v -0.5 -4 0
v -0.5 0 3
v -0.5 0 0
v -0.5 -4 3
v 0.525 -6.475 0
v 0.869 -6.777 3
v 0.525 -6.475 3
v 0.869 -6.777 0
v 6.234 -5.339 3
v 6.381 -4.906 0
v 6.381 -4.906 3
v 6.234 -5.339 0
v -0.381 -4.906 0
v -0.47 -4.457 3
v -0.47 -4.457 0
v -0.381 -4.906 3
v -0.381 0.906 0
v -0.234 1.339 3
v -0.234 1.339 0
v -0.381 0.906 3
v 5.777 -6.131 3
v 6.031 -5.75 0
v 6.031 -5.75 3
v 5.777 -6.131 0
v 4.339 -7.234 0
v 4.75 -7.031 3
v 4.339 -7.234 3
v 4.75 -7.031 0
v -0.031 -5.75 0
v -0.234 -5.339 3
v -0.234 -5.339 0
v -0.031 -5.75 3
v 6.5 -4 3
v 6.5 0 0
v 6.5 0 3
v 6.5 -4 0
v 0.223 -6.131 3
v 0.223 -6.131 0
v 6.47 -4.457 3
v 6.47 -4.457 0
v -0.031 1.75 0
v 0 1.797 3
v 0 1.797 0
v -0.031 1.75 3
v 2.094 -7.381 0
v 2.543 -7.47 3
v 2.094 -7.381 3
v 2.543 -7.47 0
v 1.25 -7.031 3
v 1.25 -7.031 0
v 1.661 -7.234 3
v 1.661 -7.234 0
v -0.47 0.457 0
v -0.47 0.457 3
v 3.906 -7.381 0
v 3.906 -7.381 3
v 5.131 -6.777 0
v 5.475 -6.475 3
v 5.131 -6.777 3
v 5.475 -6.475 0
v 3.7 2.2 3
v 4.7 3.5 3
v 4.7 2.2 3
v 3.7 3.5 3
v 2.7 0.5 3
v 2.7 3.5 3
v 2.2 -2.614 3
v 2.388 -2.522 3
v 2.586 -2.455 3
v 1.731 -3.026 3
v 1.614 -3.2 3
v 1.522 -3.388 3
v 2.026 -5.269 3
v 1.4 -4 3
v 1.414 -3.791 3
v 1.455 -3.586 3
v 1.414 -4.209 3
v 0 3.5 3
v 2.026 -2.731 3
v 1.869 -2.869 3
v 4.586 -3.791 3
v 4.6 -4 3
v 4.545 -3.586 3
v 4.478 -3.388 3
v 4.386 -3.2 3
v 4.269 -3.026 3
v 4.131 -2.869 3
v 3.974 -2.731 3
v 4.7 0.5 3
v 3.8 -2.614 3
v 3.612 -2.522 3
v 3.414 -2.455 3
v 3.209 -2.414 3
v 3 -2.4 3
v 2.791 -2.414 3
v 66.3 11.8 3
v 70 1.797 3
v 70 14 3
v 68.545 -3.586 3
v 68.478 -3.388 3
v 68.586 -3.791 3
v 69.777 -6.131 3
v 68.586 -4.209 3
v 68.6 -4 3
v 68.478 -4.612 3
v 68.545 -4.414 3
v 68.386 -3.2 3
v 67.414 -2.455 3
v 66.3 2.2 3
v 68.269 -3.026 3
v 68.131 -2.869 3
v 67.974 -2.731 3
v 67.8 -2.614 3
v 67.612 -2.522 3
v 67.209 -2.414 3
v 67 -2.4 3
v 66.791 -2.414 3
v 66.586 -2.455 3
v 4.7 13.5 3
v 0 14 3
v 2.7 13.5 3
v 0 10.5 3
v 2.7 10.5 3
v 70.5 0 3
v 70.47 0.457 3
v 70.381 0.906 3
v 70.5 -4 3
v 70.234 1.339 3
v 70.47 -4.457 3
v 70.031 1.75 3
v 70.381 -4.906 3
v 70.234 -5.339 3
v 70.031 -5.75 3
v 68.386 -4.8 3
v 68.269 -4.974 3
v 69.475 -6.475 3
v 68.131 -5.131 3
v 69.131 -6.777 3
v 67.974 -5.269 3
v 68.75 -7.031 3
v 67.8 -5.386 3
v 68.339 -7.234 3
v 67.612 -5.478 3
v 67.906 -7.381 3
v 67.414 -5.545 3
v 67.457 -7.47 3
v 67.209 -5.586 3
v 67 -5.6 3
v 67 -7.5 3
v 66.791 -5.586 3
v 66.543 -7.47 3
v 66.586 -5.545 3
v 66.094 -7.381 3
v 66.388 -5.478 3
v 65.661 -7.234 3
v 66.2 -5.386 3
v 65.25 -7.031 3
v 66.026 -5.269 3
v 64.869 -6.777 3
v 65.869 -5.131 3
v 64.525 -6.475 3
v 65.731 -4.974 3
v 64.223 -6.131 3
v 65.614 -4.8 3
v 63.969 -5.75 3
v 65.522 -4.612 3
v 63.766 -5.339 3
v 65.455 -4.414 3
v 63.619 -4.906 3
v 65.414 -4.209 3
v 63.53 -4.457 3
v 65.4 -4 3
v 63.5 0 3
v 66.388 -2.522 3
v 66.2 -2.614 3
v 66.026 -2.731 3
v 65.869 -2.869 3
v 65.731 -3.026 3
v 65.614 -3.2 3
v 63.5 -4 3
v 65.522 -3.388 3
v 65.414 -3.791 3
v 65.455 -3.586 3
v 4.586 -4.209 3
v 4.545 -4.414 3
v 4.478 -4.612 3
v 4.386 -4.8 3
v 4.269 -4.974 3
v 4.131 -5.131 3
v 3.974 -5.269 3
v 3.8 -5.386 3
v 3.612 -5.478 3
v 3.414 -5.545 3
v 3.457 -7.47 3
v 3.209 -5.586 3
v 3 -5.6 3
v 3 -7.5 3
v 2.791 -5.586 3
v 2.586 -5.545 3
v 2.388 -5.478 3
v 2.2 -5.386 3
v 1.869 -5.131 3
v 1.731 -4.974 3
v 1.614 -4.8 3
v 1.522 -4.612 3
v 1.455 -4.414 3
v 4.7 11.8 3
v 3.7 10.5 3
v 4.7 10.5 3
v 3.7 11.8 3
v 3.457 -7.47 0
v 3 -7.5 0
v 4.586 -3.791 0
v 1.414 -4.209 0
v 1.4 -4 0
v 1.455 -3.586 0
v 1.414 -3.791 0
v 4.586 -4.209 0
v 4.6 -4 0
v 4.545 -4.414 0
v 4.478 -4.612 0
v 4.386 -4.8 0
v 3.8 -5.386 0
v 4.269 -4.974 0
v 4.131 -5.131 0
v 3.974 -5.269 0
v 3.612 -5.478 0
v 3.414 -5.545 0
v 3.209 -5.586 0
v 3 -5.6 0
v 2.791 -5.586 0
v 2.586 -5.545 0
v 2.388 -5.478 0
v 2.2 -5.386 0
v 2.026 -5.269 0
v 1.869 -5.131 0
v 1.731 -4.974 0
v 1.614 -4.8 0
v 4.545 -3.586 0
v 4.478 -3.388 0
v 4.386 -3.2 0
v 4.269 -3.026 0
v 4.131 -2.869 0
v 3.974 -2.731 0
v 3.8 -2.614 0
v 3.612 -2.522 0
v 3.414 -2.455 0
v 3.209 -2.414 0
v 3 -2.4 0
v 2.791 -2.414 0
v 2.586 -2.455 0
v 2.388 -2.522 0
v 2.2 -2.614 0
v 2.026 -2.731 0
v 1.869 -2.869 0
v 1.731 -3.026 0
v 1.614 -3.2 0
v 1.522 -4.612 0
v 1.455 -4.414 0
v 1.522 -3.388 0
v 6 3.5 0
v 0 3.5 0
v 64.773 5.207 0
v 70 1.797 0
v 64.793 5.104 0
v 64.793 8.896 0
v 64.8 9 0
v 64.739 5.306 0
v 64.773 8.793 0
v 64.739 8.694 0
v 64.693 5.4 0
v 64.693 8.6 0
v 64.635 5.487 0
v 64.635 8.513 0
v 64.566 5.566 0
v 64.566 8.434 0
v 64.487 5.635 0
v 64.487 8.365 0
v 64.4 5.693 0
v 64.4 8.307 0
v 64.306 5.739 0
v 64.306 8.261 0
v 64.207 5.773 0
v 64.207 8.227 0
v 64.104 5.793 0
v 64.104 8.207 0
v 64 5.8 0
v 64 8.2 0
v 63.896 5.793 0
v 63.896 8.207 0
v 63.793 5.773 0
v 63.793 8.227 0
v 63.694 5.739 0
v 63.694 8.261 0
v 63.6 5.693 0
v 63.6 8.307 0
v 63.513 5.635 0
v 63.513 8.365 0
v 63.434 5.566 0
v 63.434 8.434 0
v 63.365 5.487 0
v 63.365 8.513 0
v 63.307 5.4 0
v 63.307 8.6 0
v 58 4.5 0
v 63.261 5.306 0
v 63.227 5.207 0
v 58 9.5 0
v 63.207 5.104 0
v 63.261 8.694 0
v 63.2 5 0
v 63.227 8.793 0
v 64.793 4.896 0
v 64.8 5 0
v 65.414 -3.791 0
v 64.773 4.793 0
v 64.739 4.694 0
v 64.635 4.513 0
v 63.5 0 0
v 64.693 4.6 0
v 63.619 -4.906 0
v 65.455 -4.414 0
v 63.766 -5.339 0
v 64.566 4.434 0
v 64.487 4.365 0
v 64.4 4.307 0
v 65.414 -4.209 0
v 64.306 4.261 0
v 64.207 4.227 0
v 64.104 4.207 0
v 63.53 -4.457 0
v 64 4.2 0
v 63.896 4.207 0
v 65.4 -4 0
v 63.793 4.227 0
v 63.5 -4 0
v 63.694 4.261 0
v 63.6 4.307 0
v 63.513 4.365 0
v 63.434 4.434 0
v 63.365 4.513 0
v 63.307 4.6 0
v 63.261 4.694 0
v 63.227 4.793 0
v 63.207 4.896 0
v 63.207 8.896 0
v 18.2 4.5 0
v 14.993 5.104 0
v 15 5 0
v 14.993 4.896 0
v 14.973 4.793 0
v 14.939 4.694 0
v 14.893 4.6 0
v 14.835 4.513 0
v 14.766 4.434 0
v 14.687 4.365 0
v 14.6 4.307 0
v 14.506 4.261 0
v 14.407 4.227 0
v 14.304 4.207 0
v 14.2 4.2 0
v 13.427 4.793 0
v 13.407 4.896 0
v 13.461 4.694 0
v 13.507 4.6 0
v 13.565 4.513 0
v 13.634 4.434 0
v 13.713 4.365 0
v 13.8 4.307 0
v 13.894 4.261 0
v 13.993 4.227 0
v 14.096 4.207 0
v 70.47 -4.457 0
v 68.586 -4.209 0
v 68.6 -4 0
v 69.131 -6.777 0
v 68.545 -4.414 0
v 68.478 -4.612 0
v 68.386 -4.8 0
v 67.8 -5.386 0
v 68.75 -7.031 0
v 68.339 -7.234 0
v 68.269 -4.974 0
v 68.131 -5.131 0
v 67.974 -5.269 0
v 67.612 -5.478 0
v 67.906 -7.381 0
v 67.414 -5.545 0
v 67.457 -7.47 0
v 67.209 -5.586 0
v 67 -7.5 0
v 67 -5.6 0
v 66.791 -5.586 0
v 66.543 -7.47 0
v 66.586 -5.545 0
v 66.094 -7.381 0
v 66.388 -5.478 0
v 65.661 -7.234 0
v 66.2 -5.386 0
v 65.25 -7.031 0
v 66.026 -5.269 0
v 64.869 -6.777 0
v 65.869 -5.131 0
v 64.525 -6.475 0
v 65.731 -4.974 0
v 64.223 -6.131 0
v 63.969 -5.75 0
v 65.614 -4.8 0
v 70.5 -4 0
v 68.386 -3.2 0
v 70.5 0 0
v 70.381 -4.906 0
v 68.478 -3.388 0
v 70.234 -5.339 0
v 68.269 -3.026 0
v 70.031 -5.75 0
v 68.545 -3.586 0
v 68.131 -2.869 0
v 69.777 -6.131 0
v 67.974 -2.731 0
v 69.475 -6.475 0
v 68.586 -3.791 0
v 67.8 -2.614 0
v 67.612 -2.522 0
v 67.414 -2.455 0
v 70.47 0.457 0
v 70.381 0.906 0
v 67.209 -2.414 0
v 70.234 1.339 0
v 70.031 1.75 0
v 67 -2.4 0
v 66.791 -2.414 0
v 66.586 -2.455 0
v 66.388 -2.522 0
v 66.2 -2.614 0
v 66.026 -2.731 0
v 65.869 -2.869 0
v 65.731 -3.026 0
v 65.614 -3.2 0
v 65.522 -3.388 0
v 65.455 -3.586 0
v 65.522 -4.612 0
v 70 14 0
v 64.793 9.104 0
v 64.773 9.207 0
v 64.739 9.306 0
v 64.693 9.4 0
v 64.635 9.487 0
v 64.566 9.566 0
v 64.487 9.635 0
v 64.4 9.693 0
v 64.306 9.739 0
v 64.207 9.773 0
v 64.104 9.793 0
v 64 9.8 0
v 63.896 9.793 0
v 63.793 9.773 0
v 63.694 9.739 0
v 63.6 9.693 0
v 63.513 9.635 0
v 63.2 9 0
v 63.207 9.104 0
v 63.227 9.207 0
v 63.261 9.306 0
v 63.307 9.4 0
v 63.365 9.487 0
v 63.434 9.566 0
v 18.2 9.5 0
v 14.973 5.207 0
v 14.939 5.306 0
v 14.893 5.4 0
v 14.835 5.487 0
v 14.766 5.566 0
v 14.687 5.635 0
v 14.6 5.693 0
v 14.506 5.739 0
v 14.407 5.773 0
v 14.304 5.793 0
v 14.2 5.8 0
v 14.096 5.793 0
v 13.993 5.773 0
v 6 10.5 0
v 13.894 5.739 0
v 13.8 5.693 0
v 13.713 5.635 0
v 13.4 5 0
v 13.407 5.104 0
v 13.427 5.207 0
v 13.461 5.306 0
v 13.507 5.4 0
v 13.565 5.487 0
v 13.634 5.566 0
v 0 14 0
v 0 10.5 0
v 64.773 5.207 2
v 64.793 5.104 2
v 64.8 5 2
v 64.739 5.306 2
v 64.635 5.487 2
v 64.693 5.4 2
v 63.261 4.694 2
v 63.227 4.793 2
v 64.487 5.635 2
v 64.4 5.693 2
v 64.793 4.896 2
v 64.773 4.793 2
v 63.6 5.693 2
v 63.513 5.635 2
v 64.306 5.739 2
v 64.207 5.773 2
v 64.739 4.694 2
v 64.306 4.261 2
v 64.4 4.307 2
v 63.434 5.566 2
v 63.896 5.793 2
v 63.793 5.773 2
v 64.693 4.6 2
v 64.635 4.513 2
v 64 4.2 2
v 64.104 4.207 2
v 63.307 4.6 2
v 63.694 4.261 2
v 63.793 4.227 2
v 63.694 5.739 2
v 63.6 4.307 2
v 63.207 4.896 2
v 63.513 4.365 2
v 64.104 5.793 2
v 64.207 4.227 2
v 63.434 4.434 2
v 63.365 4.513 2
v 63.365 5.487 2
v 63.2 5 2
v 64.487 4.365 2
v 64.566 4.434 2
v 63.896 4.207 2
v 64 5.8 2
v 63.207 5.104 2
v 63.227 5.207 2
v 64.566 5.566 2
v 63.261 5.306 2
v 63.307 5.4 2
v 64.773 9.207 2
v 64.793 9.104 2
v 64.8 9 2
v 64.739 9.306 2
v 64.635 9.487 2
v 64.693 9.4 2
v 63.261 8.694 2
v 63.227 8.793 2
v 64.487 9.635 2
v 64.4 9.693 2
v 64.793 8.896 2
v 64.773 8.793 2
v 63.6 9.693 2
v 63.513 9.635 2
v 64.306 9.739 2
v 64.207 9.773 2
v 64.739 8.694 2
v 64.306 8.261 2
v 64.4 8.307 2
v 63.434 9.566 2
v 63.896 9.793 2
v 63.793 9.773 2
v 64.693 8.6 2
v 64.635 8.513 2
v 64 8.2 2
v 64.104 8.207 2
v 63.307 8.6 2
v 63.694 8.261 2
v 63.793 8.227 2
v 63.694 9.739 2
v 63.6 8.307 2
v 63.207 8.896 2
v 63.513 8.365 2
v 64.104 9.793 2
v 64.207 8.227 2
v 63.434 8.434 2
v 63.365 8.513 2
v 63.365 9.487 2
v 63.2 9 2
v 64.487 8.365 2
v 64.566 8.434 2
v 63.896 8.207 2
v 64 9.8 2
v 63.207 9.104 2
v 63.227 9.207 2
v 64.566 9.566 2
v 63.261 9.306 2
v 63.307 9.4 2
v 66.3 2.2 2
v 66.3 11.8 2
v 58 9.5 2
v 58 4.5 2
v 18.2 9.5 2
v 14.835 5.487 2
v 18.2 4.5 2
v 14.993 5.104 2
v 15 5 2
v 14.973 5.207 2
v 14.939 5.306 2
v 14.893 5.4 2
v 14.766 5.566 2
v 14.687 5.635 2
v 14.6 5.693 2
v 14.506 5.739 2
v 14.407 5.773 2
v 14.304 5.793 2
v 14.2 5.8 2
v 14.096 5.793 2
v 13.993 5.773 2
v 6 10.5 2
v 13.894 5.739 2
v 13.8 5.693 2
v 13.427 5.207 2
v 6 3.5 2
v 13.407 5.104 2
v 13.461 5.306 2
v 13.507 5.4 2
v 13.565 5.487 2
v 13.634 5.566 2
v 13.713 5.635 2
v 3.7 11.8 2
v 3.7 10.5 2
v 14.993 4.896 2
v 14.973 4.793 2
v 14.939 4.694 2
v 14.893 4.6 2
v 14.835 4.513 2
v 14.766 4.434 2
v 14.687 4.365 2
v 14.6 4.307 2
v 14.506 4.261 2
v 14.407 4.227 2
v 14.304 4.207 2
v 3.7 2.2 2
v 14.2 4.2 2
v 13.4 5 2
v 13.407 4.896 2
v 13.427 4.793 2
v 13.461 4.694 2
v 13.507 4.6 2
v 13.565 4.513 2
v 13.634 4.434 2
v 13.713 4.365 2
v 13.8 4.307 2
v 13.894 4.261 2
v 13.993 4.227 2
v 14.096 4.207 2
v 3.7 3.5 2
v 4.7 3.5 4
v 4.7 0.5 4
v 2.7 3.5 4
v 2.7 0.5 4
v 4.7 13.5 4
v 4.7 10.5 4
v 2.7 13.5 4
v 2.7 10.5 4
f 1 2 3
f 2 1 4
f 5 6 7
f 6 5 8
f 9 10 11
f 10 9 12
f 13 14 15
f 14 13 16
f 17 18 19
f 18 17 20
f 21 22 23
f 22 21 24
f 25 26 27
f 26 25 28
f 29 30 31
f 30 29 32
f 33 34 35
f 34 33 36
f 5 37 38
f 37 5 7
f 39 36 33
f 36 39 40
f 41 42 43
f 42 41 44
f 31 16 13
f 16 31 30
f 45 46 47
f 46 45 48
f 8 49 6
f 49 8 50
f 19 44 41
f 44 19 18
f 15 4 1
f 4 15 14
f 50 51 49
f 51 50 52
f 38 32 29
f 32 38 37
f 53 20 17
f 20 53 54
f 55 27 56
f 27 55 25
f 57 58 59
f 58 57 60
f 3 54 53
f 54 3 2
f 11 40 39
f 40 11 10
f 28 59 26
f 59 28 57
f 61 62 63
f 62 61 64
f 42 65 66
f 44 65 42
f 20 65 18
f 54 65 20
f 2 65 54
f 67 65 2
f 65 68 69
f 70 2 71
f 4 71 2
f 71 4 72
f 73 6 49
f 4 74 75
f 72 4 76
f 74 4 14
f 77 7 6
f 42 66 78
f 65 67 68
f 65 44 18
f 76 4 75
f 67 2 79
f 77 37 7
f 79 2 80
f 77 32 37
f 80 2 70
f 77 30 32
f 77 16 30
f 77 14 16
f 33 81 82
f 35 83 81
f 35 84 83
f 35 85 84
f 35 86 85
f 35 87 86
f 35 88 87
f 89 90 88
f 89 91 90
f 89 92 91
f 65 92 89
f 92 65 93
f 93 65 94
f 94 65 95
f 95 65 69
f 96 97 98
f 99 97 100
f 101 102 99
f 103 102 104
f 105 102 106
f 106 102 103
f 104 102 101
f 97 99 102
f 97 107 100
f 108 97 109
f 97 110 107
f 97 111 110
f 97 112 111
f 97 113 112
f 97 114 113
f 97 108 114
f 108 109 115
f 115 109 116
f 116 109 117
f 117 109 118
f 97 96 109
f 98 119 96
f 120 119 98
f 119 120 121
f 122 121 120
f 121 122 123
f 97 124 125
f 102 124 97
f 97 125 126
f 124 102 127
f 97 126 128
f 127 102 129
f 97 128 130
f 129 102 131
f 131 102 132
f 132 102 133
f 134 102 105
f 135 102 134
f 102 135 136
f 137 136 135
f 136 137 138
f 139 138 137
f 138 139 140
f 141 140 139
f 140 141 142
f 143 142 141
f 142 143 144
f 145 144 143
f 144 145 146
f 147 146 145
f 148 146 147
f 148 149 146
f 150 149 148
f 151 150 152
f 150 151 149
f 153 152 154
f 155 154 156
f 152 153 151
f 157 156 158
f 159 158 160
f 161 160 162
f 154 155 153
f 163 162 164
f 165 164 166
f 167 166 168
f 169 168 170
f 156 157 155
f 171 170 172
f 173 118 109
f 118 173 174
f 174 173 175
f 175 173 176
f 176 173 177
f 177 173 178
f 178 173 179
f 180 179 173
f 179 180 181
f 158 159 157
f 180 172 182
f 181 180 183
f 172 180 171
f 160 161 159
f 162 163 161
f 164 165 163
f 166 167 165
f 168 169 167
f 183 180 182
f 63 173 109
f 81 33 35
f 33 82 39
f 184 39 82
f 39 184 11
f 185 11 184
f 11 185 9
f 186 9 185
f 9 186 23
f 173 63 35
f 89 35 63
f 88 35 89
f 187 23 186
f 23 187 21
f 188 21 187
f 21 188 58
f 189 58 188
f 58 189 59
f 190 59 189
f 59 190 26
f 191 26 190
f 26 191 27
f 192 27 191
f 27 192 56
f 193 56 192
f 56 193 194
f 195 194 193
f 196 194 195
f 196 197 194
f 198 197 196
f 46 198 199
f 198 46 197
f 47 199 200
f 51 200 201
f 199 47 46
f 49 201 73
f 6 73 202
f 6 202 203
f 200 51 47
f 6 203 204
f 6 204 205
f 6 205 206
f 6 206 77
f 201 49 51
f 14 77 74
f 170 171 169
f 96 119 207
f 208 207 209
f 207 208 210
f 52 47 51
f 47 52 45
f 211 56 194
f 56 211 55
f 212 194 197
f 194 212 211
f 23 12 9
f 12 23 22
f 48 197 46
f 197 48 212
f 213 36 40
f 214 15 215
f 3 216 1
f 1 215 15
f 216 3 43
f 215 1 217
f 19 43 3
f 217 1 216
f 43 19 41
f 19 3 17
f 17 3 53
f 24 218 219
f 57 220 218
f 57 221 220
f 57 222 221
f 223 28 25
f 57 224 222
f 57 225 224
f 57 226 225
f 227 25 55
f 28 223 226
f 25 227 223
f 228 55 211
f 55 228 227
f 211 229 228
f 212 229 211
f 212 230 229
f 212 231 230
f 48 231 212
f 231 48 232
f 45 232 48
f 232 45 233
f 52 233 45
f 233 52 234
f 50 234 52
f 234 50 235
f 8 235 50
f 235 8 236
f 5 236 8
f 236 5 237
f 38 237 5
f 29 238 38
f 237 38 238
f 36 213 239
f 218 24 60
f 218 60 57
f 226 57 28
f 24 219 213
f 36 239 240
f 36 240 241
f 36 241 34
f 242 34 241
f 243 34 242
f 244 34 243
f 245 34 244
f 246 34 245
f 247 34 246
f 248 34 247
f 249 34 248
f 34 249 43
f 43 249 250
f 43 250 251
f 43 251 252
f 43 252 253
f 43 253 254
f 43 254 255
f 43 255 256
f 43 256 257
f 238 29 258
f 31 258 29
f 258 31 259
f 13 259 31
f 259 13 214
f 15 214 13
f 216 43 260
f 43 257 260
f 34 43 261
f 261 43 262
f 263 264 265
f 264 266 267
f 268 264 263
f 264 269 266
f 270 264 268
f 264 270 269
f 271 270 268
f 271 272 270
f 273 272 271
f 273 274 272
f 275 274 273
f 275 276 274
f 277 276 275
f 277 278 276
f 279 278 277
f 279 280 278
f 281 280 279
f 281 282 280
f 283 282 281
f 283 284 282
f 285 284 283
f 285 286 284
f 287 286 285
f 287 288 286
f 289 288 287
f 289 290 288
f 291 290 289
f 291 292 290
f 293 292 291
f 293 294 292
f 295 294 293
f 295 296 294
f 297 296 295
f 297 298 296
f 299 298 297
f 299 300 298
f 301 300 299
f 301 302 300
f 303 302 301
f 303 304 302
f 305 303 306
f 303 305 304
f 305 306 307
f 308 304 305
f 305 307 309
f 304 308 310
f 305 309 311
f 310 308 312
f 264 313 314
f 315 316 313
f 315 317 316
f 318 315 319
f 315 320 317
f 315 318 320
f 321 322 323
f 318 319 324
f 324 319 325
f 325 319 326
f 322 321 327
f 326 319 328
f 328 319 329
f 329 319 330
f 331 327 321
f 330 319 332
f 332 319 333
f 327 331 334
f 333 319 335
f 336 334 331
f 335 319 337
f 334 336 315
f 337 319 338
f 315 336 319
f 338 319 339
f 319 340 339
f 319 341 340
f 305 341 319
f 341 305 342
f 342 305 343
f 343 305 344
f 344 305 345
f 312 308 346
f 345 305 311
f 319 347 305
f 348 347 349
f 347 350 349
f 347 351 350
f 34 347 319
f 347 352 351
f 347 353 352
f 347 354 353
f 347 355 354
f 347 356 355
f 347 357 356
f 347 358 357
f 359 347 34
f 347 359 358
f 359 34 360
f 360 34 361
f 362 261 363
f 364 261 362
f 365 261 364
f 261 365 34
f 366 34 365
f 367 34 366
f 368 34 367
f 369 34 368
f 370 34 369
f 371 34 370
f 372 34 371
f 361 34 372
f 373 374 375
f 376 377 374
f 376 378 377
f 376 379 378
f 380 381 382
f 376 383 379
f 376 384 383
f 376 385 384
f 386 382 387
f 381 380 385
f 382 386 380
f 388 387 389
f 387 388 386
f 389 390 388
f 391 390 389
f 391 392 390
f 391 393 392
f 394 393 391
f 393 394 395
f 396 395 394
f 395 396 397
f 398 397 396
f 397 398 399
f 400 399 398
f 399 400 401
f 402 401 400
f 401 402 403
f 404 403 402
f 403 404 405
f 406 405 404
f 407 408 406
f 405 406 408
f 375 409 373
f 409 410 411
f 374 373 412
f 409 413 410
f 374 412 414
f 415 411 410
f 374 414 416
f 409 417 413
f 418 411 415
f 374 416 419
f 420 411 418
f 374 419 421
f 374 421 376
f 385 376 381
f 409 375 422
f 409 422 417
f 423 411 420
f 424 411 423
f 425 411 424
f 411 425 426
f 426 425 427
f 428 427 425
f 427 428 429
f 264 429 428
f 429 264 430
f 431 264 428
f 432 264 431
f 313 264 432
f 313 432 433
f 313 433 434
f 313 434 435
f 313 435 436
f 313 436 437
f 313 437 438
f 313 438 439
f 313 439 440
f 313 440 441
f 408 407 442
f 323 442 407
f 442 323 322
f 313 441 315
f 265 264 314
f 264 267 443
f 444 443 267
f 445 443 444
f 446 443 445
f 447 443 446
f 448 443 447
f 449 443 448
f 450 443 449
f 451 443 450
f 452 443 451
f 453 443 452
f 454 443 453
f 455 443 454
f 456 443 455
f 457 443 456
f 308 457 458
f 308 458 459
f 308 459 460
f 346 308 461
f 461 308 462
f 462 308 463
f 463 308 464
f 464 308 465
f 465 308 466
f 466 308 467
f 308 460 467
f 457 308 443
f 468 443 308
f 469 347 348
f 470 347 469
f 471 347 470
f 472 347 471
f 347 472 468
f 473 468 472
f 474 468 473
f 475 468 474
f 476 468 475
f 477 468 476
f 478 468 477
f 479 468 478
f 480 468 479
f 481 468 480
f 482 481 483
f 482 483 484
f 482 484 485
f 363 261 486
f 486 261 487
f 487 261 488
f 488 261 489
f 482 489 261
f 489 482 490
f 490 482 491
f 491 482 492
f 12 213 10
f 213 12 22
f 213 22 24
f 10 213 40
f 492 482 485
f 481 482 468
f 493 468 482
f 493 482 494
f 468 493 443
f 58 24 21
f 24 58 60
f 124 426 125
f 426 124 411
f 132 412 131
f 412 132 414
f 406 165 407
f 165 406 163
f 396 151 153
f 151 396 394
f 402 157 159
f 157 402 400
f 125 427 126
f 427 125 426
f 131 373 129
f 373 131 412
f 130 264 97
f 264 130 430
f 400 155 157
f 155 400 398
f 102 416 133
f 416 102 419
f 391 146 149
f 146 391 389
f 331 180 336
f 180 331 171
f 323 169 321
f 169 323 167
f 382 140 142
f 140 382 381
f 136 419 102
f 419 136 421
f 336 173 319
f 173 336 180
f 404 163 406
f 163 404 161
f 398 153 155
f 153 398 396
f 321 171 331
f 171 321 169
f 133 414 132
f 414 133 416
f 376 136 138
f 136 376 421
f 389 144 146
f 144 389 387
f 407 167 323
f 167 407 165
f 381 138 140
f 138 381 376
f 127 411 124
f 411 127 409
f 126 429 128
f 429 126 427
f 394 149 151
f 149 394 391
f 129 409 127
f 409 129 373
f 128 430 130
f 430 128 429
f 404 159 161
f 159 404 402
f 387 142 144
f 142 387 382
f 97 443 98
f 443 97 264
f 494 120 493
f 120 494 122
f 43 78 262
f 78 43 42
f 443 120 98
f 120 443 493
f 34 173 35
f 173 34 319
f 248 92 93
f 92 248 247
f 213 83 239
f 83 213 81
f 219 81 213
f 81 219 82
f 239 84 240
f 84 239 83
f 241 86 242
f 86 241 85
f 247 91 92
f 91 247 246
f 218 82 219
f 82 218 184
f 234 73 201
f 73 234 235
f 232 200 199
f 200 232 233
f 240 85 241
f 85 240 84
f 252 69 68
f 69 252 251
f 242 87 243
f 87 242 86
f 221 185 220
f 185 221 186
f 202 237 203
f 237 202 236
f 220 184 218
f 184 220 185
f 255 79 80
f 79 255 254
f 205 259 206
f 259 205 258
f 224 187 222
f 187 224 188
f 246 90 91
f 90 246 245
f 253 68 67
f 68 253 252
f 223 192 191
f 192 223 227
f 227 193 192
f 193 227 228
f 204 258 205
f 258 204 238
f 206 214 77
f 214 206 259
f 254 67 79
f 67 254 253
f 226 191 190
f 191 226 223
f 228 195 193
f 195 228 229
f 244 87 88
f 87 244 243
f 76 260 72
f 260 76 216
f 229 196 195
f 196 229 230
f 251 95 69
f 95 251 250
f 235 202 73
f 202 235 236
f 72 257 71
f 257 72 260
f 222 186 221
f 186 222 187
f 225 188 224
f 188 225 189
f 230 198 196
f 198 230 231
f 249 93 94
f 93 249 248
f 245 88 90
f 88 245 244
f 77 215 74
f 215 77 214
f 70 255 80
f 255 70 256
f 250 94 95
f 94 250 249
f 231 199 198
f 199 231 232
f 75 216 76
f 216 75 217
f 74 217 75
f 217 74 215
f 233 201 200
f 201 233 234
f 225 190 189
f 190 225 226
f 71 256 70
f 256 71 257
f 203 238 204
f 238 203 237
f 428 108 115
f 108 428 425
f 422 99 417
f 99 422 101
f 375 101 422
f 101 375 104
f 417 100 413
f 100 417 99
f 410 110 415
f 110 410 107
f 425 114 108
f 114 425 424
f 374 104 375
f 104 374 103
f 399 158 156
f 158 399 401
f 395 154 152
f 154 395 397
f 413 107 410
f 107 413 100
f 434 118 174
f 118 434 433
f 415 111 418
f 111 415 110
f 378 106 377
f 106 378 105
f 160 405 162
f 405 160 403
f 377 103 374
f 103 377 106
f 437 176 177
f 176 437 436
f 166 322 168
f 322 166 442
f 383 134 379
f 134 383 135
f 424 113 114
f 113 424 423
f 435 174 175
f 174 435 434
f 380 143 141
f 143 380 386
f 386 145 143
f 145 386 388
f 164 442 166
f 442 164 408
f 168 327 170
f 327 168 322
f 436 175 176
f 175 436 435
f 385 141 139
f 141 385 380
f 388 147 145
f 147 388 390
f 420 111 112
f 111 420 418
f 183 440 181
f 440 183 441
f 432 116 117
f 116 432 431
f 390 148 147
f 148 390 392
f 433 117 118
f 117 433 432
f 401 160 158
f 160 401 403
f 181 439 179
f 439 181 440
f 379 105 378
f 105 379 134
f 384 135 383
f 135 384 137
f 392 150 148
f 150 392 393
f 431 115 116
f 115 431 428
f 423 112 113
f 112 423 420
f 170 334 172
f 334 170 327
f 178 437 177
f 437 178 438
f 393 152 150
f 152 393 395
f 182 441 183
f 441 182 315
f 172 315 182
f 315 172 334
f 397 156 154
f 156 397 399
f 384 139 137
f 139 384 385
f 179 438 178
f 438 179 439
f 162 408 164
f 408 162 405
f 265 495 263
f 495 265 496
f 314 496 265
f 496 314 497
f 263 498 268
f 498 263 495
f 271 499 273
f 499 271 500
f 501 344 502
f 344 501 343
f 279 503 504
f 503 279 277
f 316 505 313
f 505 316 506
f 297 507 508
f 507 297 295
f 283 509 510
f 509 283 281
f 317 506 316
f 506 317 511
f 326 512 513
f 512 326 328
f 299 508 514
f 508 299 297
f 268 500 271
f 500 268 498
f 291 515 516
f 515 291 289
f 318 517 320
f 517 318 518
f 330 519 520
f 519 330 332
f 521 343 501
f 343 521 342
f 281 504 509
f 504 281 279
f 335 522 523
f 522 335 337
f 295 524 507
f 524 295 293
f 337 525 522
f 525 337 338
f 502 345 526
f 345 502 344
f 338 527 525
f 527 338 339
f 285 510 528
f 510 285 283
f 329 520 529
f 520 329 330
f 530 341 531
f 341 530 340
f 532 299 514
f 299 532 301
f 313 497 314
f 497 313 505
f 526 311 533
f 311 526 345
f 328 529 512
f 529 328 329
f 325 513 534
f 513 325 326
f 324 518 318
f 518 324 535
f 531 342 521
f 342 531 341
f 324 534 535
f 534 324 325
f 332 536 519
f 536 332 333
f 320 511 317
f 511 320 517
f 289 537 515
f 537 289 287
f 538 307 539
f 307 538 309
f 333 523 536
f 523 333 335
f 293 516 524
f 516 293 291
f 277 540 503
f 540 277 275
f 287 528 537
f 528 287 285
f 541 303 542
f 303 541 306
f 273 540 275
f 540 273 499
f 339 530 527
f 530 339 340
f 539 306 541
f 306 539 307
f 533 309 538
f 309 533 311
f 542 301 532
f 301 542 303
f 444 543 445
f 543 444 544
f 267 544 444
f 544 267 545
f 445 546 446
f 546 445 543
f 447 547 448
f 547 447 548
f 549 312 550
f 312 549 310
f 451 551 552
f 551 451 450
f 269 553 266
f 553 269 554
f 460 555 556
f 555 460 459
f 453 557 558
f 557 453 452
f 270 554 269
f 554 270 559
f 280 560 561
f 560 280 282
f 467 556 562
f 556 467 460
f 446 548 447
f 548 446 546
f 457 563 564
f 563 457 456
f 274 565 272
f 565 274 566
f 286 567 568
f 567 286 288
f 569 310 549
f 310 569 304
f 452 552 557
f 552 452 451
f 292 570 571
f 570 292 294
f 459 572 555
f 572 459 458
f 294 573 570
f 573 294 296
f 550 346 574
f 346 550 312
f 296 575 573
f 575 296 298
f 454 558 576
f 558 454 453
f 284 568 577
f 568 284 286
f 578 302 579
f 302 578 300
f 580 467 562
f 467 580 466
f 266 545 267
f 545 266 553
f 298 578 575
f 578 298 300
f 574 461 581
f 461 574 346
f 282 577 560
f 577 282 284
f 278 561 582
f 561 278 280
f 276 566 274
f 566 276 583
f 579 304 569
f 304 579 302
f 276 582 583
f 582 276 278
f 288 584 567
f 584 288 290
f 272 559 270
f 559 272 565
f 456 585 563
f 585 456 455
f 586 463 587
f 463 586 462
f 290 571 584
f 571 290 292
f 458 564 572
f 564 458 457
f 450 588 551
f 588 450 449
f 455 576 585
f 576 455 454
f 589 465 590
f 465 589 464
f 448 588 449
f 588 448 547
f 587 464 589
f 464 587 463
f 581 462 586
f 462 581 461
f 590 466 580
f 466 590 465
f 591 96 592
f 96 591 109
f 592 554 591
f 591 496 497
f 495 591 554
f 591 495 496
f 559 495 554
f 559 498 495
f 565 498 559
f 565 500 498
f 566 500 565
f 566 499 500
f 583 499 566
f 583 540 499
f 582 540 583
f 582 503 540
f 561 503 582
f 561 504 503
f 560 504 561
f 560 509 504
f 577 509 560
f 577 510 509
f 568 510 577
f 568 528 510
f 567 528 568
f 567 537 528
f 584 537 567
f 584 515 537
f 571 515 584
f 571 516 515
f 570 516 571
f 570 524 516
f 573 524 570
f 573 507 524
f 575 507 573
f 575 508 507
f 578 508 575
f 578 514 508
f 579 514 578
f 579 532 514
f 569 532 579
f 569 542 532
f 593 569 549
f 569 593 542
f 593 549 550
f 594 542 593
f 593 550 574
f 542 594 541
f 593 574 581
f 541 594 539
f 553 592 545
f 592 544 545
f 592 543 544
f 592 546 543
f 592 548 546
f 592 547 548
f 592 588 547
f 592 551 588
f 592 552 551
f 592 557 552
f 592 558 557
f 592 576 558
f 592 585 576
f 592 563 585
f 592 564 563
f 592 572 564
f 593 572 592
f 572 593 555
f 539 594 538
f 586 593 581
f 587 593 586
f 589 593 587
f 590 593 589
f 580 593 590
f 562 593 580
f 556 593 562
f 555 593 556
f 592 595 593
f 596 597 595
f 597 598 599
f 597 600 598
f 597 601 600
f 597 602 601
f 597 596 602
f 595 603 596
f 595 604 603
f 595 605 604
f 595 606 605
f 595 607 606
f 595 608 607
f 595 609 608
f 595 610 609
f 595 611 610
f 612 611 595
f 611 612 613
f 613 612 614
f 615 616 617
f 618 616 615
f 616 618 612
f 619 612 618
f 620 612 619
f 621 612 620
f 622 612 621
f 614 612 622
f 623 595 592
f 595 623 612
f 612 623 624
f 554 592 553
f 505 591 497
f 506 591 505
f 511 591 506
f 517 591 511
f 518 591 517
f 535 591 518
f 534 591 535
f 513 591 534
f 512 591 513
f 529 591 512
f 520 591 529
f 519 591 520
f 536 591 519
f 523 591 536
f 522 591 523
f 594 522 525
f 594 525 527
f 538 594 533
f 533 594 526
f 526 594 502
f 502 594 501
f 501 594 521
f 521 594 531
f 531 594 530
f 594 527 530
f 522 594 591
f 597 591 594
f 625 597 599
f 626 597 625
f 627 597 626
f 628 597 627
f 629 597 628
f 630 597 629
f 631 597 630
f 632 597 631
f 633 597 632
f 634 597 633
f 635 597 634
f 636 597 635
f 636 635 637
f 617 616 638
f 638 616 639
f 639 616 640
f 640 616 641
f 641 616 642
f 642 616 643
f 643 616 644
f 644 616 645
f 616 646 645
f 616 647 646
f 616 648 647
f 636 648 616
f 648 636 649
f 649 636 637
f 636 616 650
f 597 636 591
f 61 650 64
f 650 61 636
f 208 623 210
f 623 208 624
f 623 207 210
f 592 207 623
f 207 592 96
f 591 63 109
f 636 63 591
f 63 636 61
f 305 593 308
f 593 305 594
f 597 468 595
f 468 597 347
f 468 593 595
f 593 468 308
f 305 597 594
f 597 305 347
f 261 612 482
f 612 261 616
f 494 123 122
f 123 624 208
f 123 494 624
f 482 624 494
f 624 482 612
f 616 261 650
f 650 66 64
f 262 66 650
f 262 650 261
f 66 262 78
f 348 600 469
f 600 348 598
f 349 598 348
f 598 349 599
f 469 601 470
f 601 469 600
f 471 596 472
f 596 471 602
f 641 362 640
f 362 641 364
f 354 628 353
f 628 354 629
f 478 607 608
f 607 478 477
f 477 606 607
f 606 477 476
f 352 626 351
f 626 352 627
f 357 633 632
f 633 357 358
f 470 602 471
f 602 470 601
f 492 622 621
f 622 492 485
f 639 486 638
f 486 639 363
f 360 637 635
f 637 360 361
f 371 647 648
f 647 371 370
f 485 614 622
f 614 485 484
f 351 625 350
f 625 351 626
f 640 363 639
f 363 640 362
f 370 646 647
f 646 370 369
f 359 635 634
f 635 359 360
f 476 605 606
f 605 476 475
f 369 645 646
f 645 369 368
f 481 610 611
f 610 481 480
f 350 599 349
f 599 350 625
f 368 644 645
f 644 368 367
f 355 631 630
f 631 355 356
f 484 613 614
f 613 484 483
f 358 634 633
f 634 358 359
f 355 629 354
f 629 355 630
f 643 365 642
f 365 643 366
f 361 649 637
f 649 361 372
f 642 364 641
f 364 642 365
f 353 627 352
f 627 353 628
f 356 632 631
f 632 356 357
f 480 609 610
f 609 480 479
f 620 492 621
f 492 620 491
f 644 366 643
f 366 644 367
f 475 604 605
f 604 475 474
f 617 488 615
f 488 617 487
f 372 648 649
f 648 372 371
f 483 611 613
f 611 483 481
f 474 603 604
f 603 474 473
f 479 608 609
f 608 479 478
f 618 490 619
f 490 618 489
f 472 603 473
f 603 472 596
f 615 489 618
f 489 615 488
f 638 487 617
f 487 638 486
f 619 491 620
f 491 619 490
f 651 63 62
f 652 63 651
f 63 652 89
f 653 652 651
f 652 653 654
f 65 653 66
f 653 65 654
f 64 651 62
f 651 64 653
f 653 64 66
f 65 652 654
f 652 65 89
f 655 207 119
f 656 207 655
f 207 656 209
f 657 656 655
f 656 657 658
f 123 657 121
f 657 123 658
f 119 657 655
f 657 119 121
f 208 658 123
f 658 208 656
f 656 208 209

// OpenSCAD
// ============================================================================
// scene_cam_top_mount_v1.scad
// Replacement backing mount ("blue bar") for the HUAQUE HQ-L103 SCENE camera.
//
// Goals:
//   * Lock the PCB down using its OWN mounting holes (no more shifting).
//   * Reuse the existing white rod clips unchanged -> replicate the L-tab ears
//     (a rounded ear at each end with a Ø3.2 clip hole at 64 mm pitch), taken
//     from the current bar's STEP file.
//
// Retention: the board drops into a full-perimeter pocket (locates it), then
// two M2 screws through its two end mounting holes clamp it flat to the plate.
// The lens/LED/components face forward and stay fully exposed; a center window
// gives component clearance + airflow (per NOTES.md).
//
// PCB dimensions are from the manufacturer datasheet (62 x 9 x 1.0 mm board;
// two Ø2.2 holes 4.0 mm apart, 2.0 mm from the end).
// ============================================================================

/* =========================================================================
   VIEW  (pick one, then F5)
   ========================================================================= */
show = "mount";   // "assembly" | "exploded" | "mount" | "pcb"

/* =========================================================================
   PCB  (from datasheet - measured)
   ========================================================================= */
pcb_len       = 62.0;   // board length
pcb_width     = 9.0;    // board width
board_thick   = 1.0;    // bare PCB thickness ("1.0pcb" on the drawing)
lens_protrude = 4.68;   // how far the camera module stands off the front face
                        // (informational: the front is left open)

// Two plated mounting holes at ONE end (the camera is 32.5 mm from this end):
hole_dia      = 2.2;    // Ø2.2 drilled hole (Ø3.2 is the pad); clears an M2 screw
hole_spacing  = 4.0;    // center-to-center, across the width, symmetric about center
hole_from_end = 2.0;    // hole-center distance from the mounting-hole end edge

// Third mounting hole near the connector end (datasheet Ø2.2) -> 3-point clamp:
third_hole      = true;
third_from_conn = 10.2; // its center distance from the connector-end edge
third_y_offset  = -2.0; // offset from the width centerline (datasheet "2.00",
                        // lined up under one of the two end holes; flip sign or
                        // set 0 if your board's hole sits elsewhere)

/* =========================================================================
   CLIP INTERFACE  (from the current bar's STEP file - fixed)
   The white clips bolt to a rounded "ear" at each end with a Ø3.2 hole.
   ========================================================================= */
clip_hole_dia   = 3.2;   // clip screw clearance hole
clip_hole_pitch = 64.0;  // distance between the two clip screws
clip_end_margin = 3.0;   // ears sit 3 mm in from each bar end
bar_len         = clip_hole_pitch + 2*clip_end_margin;   // -> 70 mm
clip_ear_dia    = 7.0;   // rounded ear around the clip hole
clip_ear_drop   = 4.0;   // how far the ear's hole sits beyond the rod-side edge
                         //   (larger = clips/rod sit further from the board)

/* =========================================================================
   PLATE + RETENTION  (tunable)
   ========================================================================= */
frame          = 2.5;    // border of plate around the PCB on the long edges
plate_t        = 3.0;    // backing-plate thickness
pocket_clear   = 0.30;   // gap around the PCB in the pocket (per side)
use_insert     = false;  // false = M2 self-tap into plastic; true = heat-set insert
screw_pilot_dia= 1.6;    // pilot for an M2 self-tapping screw
insert_dia     = 3.2;    // hole for an M2 brass heat-set insert
win_end_inset  = 8.0;    // airflow window kept this far from each PCB end
win_edge_inset = 2.0;    // airflow window kept this far from each long edge
conn_relief_w  = 7.0;    // width of the open relief at the connector end (for the
                         // USB plug); the connector is on the FRONT, plate is behind
lip_reach      = 1.0;    // connector-end hold-down lip overhang
lip_w          = 3.0;    // width of each connector-end lip
lip_h          = 1.0;    // thickness of each lip

$fn = 48;

/* =========================================================================
   DERIVED
   ========================================================================= */
plate_h  = pcb_width + 2*frame;         // ~14 mm
pcb_x0   = (bar_len - pcb_len)/2;        // PCB left edge (centered) -> 4
pcb_y0   = (plate_h - pcb_width)/2;      // PCB bottom edge -> 2.5
pocket_z = plate_t - board_thick;        // pocket floor -> 2.0
board_top= plate_t;

// +X end = mounting-hole end;  -X end = connector end
hole_x   = pcb_x0 + pcb_len - hole_from_end;
hole_ys  = [ plate_h/2 - hole_spacing/2, plate_h/2 + hole_spacing/2 ];
third_x  = pcb_x0 + third_from_conn;
third_y  = plate_h/2 + third_y_offset;

// airflow window x-span (kept clear of the third hole so it has a solid seat)
win_x0 = third_hole ? max(pcb_x0 + win_end_inset, third_x + 4) : pcb_x0 + win_end_inset;
win_x1 = pcb_x0 + pcb_len - win_end_inset;

// clip ears on the rod-side long edge (y = 0), at each end
clip_xs   = [ clip_end_margin, clip_end_margin + clip_hole_pitch ];
clip_ear_y = -clip_ear_drop;

// datasheet feature positions (from the mounting-hole end), for the mock
cam_x = hole_x - (32.5 - hole_from_end);   // camera 32.5 mm from that end
led_x = hole_x - (12.5 - hole_from_end);   // LED  12.5 mm from that end

/* =========================================================================
   MODULES
   ========================================================================= */

// Visual stand-in for the scene PCB (holes + lens + LED + connector)
module pcb_mock() {
    color("DarkSlateGray")
    translate([pcb_x0, pcb_y0, pocket_z])
        difference() {
            cube([pcb_len, pcb_width, board_thick]);
            for (y = hole_ys)
                translate([hole_x - pcb_x0, y - pcb_y0, -1])
                    cylinder(h = board_thick + 2, d = hole_dia);
            if (third_hole)
                translate([third_x - pcb_x0, pcb_width/2 + third_y_offset, -1])
                    cylinder(h = board_thick + 2, d = hole_dia);
        }
    color("Black") translate([cam_x, plate_h/2, board_top]) cylinder(h = lens_protrude, d = 5.68);
    color("Khaki") translate([led_x, plate_h/2 - 1.75, board_top]) cube([3.5, 3.5, 1.2]);
    // connector: on the FRONT face at the connector end, socket opening faces -X
    color("Gainsboro")
        translate([pcb_x0, plate_h/2 - 3, board_top]) cube([5, 6, 2.6]);
    // mating USB plug + cable exiting off the -X end (shows the space it needs)
    color("DimGray")
        translate([pcb_x0 - 7, plate_h/2 - 2, board_top + 0.4]) cube([8, 4, 1.8]);
}

// The backing mount
module top_mount() {
    difference() {
        union() {
            cube([bar_len, plate_h, plate_t]);
            // clip ears (L-tabs): a rounded tab reaching from the rod-side edge
            // out to the clip hole (stays fused to the plate at any drop)
            for (x = clip_xs)
                hull() {
                    translate([x, 0, 0])         cylinder(h = plate_t, d = clip_ear_dia);
                    translate([x, clip_ear_y, 0]) cylinder(h = plate_t, d = clip_ear_dia);
                }
        }

        // PCB pocket (locates the board)
        translate([pcb_x0 - pocket_clear, pcb_y0 - pocket_clear, pocket_z])
            cube([pcb_len + 2*pocket_clear, pcb_width + 2*pocket_clear, board_thick + 10]);

        // airflow / component-relief window (clear of the screw pilots)
        translate([win_x0, pcb_y0 + win_edge_inset, -1])
            cube([win_x1 - win_x0, pcb_width - 2*win_edge_inset, plate_t + 2]);

        // connector / plug relief: fully open the -X end center so the USB plug
        // can be inserted and the cable routed out
        translate([-3, plate_h/2 - conn_relief_w/2, -1])
            cube([pcb_x0 + 2 + 3, conn_relief_w, plate_t + 2]);

        // clip screw holes (through the ears)
        for (x = clip_xs)
            translate([x, clip_ear_y, -1]) cylinder(h = plate_t + 2, d = clip_hole_dia);

        // mounting-screw holes (self-tap pilot, or insert bore)
        for (y = hole_ys)
            translate([hole_x, y, -1])
                cylinder(h = plate_t + 2, d = use_insert ? insert_dia : screw_pilot_dia);
        if (third_hole)
            translate([third_x, third_y, -1])
                cylinder(h = plate_t + 2, d = use_insert ? insert_dia : screw_pilot_dia);
    }

    // connector-end hold-down lips (flank the cable notch, hold that end flat)
    for (sy = [-1, 1])
        translate([pcb_x0 - pocket_clear - 1.0,
                   plate_h/2 + sy*(conn_relief_w/2 + lip_w/2) - lip_w/2,
                   board_top])
            cube([1.0 + lip_reach, lip_w, lip_h]);
}

/* =========================================================================
   OUTPUT
   ========================================================================= */
if (show == "assembly") {
    color("LightSteelBlue") top_mount();
    pcb_mock();
} else if (show == "exploded") {
    color("LightSteelBlue") top_mount();
    translate([0, 0, 16]) pcb_mock();
} else if (show == "mount") {
    top_mount();          // export this to STL
} else if (show == "pcb") {
    pcb_mock();
}
